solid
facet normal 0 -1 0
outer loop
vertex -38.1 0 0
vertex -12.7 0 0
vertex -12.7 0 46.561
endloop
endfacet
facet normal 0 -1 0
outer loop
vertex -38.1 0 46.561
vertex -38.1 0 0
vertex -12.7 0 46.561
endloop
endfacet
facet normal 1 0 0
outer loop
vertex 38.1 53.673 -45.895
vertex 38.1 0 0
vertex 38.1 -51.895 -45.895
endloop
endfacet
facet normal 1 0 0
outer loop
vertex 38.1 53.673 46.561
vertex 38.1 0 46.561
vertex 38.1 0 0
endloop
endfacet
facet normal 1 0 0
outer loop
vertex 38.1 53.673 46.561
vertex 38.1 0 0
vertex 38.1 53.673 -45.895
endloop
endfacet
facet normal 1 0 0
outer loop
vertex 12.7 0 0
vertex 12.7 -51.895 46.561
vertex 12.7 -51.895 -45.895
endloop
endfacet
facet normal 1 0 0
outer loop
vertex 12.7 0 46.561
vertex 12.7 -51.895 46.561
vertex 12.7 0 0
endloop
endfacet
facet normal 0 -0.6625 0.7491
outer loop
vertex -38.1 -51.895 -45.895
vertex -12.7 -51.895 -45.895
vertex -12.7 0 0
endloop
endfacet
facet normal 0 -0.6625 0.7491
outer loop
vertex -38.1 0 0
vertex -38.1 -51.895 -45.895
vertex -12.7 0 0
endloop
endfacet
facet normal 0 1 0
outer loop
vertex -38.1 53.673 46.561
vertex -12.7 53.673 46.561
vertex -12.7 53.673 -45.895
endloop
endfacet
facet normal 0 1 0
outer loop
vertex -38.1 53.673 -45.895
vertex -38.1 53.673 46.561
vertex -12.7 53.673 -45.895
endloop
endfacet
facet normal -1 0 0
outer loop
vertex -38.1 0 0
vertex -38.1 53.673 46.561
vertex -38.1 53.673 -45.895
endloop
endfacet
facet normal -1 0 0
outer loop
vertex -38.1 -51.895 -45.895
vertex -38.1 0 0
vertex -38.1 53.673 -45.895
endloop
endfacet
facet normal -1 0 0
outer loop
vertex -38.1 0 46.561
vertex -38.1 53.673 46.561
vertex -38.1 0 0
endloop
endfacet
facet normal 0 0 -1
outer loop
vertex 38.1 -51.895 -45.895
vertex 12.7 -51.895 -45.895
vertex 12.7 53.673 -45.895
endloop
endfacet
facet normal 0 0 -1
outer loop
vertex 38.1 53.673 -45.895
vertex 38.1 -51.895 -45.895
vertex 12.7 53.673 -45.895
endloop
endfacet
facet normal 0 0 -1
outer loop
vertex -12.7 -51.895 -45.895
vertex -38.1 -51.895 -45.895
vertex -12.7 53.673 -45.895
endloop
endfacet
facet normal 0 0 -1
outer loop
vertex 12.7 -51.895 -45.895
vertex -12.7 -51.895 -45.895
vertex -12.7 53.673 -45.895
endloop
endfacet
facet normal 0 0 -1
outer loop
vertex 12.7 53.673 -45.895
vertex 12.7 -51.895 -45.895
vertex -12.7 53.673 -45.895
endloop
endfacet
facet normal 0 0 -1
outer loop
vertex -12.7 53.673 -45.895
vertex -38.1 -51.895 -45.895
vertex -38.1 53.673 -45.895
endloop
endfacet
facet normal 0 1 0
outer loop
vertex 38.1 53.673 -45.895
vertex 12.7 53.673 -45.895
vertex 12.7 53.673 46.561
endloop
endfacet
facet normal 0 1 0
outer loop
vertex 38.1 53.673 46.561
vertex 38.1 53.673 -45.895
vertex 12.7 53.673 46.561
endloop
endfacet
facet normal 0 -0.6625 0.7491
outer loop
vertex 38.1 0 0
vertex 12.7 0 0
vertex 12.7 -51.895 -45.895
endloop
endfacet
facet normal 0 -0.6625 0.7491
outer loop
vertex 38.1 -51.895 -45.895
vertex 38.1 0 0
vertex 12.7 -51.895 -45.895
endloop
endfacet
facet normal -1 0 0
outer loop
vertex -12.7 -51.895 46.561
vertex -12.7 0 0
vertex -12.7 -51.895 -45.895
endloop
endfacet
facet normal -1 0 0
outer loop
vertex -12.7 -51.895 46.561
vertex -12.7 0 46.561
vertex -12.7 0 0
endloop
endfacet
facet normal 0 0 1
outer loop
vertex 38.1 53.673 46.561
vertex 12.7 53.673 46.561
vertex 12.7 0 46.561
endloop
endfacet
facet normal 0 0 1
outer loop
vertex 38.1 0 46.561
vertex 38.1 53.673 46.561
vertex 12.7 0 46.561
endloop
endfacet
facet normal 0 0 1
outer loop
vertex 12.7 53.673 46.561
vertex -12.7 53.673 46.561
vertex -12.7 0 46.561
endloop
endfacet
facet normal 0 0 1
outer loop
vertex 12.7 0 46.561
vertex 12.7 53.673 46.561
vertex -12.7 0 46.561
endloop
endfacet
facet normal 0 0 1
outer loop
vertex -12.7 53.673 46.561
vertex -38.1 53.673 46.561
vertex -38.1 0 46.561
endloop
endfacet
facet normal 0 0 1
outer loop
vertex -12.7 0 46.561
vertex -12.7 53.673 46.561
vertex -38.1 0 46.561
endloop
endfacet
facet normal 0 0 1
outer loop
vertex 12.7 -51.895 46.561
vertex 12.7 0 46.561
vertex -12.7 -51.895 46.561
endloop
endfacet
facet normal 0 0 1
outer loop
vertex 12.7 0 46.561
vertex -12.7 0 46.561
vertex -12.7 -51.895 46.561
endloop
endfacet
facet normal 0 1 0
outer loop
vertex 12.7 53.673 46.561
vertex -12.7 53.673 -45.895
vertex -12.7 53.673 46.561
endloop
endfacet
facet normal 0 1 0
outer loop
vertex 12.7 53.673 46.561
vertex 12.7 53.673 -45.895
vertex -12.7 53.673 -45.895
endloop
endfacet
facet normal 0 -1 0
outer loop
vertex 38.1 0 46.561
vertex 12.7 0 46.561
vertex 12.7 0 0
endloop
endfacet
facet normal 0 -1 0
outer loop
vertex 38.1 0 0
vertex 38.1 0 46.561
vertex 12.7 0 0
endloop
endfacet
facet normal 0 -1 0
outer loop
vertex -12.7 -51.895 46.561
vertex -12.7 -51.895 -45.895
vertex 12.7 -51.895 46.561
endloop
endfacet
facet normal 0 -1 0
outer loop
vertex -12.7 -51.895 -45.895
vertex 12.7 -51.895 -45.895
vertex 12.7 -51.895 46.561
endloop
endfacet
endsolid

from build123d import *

# Parameters (mm, degrees)
F0_W     = 105.568755
F0_H     = 92.456006
F1_DEPTH = 12.7
F2_W     = 105.568755
F2_H     = 92.456006
F3_DEPTH = 12.7
F5_DEPTH = 25.4
F7_DEPTH = 25.4


with BuildPart() as f1:
    # F0 (on Right) → F1 (new body)
    with BuildSketch(Plane.YZ):
        with Locations((0.889001, 0.333376)):
            Rectangle(F0_W, F0_H)
    extrude(amount=F1_DEPTH)

    # F2 (on face) → F3 (join)
    with BuildSketch(Plane(origin=(0, 0, 0), x_dir=(0, -1, 0), z_dir=(-1, 0, 0))):
        with Locations((-0.889001, 0.333376)):
            Rectangle(F2_W, F2_H)
    extrude(amount=F3_DEPTH)

    # F4 (on face) → F5 (join)
    with BuildSketch(Plane(origin=(-12.7, 0, 0), x_dir=(0, -1, 0), z_dir=(-1, 0, 0))):
        Polygon((51.895376, -45.894627), (0, 0), (0, 46.561379), (-53.673379, 46.561379), (-53.673379, -45.894627), align=None)
    extrude(amount=F5_DEPTH)

    # F6 (on face) → F7 (join)
    with BuildSketch(Plane.YZ.offset(12.7)):
        Polygon((0, 46.561379), (0, 0), (-51.895376, -45.894627), (53.673379, -45.894627), (53.673379, 46.561379), align=None)
    extrude(amount=F7_DEPTH)


solid = f1.part
